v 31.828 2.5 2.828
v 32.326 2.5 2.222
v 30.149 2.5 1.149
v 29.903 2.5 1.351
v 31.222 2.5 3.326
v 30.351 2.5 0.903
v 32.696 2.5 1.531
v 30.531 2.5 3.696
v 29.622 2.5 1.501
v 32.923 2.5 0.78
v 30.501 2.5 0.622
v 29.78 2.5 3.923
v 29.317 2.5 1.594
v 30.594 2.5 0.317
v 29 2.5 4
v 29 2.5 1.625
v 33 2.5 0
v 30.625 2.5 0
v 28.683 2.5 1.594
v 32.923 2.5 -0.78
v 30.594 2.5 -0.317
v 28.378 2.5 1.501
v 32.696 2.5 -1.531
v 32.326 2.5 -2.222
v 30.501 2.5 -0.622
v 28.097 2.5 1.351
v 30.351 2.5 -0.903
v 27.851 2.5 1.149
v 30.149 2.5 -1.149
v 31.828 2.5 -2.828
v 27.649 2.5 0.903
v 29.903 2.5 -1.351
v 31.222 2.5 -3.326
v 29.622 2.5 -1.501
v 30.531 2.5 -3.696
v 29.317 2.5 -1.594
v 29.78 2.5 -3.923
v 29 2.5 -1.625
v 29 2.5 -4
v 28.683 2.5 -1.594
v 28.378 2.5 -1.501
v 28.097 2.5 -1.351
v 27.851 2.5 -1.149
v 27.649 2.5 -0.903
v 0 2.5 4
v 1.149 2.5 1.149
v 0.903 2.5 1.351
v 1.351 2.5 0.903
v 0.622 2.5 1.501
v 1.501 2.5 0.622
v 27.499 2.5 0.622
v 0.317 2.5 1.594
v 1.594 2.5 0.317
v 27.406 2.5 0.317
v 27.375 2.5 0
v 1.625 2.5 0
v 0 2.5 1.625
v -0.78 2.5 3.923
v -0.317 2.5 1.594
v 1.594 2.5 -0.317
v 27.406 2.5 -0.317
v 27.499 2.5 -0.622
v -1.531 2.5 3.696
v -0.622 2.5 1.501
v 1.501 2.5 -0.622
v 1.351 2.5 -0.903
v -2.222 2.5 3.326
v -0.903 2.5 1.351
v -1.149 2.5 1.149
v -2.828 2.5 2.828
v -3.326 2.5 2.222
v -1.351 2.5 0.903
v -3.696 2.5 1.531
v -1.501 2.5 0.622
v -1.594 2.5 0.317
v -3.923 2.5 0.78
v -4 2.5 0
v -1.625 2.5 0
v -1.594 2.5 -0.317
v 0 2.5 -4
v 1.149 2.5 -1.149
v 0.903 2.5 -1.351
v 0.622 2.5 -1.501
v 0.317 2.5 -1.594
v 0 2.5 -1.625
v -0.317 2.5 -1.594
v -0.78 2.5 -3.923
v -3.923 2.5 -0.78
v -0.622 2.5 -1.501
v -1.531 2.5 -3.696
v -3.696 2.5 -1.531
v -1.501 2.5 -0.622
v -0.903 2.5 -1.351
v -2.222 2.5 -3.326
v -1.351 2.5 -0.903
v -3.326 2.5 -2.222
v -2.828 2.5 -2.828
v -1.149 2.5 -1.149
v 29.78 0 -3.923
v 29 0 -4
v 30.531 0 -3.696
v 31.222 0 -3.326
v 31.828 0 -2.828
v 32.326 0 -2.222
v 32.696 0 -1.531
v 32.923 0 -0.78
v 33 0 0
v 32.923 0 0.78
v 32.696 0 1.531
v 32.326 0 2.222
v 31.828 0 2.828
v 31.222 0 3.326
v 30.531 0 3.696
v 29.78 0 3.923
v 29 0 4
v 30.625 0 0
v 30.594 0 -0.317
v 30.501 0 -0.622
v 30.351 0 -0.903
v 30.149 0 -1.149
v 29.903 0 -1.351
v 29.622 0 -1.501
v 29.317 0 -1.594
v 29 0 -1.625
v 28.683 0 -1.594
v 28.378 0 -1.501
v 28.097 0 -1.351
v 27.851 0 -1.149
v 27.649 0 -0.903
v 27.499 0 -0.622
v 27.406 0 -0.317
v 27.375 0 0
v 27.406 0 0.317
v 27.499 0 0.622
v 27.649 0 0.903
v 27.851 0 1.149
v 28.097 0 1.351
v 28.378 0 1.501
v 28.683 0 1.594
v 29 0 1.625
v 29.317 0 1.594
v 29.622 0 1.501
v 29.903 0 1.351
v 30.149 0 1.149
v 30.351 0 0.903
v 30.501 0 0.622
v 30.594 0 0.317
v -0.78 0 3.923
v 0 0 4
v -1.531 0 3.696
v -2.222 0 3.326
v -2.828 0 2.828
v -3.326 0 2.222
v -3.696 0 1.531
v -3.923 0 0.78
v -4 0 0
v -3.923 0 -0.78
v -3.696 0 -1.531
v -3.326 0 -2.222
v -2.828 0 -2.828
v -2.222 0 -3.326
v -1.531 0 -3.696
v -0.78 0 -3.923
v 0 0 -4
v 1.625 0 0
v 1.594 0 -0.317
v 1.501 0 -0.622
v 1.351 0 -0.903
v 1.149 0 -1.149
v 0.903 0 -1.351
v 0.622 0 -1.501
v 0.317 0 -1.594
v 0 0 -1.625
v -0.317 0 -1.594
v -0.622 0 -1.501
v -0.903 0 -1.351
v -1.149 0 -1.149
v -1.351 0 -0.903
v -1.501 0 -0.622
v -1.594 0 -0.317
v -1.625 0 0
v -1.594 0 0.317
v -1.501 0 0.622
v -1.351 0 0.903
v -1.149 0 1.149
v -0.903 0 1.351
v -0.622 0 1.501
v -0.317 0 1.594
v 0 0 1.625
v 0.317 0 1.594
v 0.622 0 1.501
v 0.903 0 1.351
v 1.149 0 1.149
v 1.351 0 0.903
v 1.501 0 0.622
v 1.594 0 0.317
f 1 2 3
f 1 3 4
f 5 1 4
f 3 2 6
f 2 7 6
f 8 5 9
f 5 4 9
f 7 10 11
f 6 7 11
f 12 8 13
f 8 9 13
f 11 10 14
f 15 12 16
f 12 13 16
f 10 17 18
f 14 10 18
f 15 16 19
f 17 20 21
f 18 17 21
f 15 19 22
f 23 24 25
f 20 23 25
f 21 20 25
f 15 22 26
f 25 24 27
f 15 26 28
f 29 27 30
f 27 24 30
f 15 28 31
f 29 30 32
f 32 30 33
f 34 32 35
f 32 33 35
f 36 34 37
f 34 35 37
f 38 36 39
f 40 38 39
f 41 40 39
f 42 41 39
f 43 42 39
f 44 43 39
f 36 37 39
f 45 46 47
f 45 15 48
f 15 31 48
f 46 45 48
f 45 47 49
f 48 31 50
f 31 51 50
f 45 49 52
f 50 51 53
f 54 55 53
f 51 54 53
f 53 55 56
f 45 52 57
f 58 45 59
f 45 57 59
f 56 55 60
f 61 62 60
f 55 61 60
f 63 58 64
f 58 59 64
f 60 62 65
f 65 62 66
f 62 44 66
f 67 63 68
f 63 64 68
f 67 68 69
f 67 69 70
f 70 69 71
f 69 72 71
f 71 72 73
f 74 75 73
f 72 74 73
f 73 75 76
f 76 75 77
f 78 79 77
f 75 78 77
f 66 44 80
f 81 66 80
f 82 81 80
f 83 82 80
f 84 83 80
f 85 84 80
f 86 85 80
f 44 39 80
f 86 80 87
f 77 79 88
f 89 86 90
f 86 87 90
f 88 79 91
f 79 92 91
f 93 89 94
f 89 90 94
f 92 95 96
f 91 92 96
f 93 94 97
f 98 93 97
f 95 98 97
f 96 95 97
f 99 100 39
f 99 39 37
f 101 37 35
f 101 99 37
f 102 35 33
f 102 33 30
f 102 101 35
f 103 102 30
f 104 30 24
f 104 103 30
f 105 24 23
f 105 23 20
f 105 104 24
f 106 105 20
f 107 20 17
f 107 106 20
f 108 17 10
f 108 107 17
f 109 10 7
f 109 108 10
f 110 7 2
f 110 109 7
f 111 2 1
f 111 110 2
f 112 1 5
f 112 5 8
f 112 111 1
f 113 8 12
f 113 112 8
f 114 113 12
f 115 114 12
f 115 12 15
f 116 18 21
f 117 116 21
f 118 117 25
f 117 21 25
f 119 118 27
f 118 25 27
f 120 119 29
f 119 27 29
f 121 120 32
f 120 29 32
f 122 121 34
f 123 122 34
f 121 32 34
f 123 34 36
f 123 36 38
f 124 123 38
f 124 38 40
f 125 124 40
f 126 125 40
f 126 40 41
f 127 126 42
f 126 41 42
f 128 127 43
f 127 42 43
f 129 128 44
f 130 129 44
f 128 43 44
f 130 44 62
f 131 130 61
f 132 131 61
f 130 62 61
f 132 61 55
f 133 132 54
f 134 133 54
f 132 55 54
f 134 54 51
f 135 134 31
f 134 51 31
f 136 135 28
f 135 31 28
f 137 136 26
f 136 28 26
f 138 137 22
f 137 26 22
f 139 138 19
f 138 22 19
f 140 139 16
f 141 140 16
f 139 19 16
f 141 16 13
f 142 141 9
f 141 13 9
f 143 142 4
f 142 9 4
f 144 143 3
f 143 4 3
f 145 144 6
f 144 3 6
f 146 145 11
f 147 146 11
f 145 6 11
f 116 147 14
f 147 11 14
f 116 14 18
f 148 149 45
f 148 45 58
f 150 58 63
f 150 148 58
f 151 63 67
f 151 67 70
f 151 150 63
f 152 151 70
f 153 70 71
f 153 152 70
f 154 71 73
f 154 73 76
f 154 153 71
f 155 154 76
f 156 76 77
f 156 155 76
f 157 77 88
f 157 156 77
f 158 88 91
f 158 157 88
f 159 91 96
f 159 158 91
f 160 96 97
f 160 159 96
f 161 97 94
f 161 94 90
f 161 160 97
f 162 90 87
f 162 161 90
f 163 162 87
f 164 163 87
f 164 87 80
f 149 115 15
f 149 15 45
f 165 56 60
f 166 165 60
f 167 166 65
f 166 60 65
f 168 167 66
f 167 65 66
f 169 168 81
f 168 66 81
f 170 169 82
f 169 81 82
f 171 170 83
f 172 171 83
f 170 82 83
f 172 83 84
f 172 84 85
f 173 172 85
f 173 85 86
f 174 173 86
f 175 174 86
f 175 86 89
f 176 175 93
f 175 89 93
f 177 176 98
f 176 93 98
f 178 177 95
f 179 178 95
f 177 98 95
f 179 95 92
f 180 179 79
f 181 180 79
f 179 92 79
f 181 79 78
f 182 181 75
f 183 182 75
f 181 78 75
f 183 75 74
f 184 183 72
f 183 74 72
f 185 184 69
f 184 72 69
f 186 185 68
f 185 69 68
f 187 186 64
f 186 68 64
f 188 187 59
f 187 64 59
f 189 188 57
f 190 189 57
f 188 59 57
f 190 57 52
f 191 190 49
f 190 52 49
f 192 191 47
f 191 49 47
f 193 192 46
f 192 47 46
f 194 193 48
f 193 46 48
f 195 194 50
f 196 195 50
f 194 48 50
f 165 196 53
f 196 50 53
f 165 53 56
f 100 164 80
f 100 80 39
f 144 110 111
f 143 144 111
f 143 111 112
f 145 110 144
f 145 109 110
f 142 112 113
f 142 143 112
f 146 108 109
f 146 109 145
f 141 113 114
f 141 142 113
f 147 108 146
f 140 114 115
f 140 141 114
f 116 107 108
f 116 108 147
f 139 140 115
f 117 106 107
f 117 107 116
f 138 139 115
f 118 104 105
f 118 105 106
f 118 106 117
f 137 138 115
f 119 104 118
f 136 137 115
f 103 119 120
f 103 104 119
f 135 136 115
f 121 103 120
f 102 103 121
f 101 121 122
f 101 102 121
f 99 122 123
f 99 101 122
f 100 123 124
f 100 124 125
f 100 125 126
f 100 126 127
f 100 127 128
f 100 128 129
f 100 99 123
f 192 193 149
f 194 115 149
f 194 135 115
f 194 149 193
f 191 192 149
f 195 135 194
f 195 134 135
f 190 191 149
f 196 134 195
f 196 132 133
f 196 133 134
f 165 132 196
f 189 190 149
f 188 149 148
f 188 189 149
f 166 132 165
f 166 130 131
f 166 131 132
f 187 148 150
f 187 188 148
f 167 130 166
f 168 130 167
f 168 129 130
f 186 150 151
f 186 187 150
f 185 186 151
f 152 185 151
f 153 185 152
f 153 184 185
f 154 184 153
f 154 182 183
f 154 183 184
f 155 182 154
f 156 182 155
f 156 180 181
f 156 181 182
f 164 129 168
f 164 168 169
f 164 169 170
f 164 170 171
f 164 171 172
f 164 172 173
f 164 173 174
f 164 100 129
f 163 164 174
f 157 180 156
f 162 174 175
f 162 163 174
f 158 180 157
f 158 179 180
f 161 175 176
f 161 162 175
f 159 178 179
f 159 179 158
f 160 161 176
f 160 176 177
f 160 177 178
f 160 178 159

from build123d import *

# Parameters (mm, degrees)
BOSS_EXTRUDE1_DEPTH = 2.5
SKETCH2_R           = 1.625
CUT_EXTRUDE1_DEPTH  = 2.5


with BuildPart() as part:
    # Sketch1 → Boss-Extrude1 (new body)
    with BuildSketch(Plane(origin=(0, 0, 0), x_dir=(1, 0, 0), z_dir=(0, 1, 0))):
        with BuildLine():
            Line((0, 4), (29, 4))
            ThreePointArc((29, 4), (33, 0), (29, -4))
            Line((29, -4), (0, -4))
            ThreePointArc((0, -4), (-4, 0), (0, 4))
        make_face()
    extrude(amount=BOSS_EXTRUDE1_DEPTH)

    # Sketch2 → Cut-Extrude1 (cut)
    with BuildSketch(Plane(origin=(0, 2.5, 0), x_dir=(1, 0, 0), z_dir=(0, 1, 0))):
        Circle(SKETCH2_R)
        with Locations((29, 0)):
            Circle(SKETCH2_R)
    extrude(amount=-CUT_EXTRUDE1_DEPTH, mode=Mode.SUBTRACT)


solid = part.part
